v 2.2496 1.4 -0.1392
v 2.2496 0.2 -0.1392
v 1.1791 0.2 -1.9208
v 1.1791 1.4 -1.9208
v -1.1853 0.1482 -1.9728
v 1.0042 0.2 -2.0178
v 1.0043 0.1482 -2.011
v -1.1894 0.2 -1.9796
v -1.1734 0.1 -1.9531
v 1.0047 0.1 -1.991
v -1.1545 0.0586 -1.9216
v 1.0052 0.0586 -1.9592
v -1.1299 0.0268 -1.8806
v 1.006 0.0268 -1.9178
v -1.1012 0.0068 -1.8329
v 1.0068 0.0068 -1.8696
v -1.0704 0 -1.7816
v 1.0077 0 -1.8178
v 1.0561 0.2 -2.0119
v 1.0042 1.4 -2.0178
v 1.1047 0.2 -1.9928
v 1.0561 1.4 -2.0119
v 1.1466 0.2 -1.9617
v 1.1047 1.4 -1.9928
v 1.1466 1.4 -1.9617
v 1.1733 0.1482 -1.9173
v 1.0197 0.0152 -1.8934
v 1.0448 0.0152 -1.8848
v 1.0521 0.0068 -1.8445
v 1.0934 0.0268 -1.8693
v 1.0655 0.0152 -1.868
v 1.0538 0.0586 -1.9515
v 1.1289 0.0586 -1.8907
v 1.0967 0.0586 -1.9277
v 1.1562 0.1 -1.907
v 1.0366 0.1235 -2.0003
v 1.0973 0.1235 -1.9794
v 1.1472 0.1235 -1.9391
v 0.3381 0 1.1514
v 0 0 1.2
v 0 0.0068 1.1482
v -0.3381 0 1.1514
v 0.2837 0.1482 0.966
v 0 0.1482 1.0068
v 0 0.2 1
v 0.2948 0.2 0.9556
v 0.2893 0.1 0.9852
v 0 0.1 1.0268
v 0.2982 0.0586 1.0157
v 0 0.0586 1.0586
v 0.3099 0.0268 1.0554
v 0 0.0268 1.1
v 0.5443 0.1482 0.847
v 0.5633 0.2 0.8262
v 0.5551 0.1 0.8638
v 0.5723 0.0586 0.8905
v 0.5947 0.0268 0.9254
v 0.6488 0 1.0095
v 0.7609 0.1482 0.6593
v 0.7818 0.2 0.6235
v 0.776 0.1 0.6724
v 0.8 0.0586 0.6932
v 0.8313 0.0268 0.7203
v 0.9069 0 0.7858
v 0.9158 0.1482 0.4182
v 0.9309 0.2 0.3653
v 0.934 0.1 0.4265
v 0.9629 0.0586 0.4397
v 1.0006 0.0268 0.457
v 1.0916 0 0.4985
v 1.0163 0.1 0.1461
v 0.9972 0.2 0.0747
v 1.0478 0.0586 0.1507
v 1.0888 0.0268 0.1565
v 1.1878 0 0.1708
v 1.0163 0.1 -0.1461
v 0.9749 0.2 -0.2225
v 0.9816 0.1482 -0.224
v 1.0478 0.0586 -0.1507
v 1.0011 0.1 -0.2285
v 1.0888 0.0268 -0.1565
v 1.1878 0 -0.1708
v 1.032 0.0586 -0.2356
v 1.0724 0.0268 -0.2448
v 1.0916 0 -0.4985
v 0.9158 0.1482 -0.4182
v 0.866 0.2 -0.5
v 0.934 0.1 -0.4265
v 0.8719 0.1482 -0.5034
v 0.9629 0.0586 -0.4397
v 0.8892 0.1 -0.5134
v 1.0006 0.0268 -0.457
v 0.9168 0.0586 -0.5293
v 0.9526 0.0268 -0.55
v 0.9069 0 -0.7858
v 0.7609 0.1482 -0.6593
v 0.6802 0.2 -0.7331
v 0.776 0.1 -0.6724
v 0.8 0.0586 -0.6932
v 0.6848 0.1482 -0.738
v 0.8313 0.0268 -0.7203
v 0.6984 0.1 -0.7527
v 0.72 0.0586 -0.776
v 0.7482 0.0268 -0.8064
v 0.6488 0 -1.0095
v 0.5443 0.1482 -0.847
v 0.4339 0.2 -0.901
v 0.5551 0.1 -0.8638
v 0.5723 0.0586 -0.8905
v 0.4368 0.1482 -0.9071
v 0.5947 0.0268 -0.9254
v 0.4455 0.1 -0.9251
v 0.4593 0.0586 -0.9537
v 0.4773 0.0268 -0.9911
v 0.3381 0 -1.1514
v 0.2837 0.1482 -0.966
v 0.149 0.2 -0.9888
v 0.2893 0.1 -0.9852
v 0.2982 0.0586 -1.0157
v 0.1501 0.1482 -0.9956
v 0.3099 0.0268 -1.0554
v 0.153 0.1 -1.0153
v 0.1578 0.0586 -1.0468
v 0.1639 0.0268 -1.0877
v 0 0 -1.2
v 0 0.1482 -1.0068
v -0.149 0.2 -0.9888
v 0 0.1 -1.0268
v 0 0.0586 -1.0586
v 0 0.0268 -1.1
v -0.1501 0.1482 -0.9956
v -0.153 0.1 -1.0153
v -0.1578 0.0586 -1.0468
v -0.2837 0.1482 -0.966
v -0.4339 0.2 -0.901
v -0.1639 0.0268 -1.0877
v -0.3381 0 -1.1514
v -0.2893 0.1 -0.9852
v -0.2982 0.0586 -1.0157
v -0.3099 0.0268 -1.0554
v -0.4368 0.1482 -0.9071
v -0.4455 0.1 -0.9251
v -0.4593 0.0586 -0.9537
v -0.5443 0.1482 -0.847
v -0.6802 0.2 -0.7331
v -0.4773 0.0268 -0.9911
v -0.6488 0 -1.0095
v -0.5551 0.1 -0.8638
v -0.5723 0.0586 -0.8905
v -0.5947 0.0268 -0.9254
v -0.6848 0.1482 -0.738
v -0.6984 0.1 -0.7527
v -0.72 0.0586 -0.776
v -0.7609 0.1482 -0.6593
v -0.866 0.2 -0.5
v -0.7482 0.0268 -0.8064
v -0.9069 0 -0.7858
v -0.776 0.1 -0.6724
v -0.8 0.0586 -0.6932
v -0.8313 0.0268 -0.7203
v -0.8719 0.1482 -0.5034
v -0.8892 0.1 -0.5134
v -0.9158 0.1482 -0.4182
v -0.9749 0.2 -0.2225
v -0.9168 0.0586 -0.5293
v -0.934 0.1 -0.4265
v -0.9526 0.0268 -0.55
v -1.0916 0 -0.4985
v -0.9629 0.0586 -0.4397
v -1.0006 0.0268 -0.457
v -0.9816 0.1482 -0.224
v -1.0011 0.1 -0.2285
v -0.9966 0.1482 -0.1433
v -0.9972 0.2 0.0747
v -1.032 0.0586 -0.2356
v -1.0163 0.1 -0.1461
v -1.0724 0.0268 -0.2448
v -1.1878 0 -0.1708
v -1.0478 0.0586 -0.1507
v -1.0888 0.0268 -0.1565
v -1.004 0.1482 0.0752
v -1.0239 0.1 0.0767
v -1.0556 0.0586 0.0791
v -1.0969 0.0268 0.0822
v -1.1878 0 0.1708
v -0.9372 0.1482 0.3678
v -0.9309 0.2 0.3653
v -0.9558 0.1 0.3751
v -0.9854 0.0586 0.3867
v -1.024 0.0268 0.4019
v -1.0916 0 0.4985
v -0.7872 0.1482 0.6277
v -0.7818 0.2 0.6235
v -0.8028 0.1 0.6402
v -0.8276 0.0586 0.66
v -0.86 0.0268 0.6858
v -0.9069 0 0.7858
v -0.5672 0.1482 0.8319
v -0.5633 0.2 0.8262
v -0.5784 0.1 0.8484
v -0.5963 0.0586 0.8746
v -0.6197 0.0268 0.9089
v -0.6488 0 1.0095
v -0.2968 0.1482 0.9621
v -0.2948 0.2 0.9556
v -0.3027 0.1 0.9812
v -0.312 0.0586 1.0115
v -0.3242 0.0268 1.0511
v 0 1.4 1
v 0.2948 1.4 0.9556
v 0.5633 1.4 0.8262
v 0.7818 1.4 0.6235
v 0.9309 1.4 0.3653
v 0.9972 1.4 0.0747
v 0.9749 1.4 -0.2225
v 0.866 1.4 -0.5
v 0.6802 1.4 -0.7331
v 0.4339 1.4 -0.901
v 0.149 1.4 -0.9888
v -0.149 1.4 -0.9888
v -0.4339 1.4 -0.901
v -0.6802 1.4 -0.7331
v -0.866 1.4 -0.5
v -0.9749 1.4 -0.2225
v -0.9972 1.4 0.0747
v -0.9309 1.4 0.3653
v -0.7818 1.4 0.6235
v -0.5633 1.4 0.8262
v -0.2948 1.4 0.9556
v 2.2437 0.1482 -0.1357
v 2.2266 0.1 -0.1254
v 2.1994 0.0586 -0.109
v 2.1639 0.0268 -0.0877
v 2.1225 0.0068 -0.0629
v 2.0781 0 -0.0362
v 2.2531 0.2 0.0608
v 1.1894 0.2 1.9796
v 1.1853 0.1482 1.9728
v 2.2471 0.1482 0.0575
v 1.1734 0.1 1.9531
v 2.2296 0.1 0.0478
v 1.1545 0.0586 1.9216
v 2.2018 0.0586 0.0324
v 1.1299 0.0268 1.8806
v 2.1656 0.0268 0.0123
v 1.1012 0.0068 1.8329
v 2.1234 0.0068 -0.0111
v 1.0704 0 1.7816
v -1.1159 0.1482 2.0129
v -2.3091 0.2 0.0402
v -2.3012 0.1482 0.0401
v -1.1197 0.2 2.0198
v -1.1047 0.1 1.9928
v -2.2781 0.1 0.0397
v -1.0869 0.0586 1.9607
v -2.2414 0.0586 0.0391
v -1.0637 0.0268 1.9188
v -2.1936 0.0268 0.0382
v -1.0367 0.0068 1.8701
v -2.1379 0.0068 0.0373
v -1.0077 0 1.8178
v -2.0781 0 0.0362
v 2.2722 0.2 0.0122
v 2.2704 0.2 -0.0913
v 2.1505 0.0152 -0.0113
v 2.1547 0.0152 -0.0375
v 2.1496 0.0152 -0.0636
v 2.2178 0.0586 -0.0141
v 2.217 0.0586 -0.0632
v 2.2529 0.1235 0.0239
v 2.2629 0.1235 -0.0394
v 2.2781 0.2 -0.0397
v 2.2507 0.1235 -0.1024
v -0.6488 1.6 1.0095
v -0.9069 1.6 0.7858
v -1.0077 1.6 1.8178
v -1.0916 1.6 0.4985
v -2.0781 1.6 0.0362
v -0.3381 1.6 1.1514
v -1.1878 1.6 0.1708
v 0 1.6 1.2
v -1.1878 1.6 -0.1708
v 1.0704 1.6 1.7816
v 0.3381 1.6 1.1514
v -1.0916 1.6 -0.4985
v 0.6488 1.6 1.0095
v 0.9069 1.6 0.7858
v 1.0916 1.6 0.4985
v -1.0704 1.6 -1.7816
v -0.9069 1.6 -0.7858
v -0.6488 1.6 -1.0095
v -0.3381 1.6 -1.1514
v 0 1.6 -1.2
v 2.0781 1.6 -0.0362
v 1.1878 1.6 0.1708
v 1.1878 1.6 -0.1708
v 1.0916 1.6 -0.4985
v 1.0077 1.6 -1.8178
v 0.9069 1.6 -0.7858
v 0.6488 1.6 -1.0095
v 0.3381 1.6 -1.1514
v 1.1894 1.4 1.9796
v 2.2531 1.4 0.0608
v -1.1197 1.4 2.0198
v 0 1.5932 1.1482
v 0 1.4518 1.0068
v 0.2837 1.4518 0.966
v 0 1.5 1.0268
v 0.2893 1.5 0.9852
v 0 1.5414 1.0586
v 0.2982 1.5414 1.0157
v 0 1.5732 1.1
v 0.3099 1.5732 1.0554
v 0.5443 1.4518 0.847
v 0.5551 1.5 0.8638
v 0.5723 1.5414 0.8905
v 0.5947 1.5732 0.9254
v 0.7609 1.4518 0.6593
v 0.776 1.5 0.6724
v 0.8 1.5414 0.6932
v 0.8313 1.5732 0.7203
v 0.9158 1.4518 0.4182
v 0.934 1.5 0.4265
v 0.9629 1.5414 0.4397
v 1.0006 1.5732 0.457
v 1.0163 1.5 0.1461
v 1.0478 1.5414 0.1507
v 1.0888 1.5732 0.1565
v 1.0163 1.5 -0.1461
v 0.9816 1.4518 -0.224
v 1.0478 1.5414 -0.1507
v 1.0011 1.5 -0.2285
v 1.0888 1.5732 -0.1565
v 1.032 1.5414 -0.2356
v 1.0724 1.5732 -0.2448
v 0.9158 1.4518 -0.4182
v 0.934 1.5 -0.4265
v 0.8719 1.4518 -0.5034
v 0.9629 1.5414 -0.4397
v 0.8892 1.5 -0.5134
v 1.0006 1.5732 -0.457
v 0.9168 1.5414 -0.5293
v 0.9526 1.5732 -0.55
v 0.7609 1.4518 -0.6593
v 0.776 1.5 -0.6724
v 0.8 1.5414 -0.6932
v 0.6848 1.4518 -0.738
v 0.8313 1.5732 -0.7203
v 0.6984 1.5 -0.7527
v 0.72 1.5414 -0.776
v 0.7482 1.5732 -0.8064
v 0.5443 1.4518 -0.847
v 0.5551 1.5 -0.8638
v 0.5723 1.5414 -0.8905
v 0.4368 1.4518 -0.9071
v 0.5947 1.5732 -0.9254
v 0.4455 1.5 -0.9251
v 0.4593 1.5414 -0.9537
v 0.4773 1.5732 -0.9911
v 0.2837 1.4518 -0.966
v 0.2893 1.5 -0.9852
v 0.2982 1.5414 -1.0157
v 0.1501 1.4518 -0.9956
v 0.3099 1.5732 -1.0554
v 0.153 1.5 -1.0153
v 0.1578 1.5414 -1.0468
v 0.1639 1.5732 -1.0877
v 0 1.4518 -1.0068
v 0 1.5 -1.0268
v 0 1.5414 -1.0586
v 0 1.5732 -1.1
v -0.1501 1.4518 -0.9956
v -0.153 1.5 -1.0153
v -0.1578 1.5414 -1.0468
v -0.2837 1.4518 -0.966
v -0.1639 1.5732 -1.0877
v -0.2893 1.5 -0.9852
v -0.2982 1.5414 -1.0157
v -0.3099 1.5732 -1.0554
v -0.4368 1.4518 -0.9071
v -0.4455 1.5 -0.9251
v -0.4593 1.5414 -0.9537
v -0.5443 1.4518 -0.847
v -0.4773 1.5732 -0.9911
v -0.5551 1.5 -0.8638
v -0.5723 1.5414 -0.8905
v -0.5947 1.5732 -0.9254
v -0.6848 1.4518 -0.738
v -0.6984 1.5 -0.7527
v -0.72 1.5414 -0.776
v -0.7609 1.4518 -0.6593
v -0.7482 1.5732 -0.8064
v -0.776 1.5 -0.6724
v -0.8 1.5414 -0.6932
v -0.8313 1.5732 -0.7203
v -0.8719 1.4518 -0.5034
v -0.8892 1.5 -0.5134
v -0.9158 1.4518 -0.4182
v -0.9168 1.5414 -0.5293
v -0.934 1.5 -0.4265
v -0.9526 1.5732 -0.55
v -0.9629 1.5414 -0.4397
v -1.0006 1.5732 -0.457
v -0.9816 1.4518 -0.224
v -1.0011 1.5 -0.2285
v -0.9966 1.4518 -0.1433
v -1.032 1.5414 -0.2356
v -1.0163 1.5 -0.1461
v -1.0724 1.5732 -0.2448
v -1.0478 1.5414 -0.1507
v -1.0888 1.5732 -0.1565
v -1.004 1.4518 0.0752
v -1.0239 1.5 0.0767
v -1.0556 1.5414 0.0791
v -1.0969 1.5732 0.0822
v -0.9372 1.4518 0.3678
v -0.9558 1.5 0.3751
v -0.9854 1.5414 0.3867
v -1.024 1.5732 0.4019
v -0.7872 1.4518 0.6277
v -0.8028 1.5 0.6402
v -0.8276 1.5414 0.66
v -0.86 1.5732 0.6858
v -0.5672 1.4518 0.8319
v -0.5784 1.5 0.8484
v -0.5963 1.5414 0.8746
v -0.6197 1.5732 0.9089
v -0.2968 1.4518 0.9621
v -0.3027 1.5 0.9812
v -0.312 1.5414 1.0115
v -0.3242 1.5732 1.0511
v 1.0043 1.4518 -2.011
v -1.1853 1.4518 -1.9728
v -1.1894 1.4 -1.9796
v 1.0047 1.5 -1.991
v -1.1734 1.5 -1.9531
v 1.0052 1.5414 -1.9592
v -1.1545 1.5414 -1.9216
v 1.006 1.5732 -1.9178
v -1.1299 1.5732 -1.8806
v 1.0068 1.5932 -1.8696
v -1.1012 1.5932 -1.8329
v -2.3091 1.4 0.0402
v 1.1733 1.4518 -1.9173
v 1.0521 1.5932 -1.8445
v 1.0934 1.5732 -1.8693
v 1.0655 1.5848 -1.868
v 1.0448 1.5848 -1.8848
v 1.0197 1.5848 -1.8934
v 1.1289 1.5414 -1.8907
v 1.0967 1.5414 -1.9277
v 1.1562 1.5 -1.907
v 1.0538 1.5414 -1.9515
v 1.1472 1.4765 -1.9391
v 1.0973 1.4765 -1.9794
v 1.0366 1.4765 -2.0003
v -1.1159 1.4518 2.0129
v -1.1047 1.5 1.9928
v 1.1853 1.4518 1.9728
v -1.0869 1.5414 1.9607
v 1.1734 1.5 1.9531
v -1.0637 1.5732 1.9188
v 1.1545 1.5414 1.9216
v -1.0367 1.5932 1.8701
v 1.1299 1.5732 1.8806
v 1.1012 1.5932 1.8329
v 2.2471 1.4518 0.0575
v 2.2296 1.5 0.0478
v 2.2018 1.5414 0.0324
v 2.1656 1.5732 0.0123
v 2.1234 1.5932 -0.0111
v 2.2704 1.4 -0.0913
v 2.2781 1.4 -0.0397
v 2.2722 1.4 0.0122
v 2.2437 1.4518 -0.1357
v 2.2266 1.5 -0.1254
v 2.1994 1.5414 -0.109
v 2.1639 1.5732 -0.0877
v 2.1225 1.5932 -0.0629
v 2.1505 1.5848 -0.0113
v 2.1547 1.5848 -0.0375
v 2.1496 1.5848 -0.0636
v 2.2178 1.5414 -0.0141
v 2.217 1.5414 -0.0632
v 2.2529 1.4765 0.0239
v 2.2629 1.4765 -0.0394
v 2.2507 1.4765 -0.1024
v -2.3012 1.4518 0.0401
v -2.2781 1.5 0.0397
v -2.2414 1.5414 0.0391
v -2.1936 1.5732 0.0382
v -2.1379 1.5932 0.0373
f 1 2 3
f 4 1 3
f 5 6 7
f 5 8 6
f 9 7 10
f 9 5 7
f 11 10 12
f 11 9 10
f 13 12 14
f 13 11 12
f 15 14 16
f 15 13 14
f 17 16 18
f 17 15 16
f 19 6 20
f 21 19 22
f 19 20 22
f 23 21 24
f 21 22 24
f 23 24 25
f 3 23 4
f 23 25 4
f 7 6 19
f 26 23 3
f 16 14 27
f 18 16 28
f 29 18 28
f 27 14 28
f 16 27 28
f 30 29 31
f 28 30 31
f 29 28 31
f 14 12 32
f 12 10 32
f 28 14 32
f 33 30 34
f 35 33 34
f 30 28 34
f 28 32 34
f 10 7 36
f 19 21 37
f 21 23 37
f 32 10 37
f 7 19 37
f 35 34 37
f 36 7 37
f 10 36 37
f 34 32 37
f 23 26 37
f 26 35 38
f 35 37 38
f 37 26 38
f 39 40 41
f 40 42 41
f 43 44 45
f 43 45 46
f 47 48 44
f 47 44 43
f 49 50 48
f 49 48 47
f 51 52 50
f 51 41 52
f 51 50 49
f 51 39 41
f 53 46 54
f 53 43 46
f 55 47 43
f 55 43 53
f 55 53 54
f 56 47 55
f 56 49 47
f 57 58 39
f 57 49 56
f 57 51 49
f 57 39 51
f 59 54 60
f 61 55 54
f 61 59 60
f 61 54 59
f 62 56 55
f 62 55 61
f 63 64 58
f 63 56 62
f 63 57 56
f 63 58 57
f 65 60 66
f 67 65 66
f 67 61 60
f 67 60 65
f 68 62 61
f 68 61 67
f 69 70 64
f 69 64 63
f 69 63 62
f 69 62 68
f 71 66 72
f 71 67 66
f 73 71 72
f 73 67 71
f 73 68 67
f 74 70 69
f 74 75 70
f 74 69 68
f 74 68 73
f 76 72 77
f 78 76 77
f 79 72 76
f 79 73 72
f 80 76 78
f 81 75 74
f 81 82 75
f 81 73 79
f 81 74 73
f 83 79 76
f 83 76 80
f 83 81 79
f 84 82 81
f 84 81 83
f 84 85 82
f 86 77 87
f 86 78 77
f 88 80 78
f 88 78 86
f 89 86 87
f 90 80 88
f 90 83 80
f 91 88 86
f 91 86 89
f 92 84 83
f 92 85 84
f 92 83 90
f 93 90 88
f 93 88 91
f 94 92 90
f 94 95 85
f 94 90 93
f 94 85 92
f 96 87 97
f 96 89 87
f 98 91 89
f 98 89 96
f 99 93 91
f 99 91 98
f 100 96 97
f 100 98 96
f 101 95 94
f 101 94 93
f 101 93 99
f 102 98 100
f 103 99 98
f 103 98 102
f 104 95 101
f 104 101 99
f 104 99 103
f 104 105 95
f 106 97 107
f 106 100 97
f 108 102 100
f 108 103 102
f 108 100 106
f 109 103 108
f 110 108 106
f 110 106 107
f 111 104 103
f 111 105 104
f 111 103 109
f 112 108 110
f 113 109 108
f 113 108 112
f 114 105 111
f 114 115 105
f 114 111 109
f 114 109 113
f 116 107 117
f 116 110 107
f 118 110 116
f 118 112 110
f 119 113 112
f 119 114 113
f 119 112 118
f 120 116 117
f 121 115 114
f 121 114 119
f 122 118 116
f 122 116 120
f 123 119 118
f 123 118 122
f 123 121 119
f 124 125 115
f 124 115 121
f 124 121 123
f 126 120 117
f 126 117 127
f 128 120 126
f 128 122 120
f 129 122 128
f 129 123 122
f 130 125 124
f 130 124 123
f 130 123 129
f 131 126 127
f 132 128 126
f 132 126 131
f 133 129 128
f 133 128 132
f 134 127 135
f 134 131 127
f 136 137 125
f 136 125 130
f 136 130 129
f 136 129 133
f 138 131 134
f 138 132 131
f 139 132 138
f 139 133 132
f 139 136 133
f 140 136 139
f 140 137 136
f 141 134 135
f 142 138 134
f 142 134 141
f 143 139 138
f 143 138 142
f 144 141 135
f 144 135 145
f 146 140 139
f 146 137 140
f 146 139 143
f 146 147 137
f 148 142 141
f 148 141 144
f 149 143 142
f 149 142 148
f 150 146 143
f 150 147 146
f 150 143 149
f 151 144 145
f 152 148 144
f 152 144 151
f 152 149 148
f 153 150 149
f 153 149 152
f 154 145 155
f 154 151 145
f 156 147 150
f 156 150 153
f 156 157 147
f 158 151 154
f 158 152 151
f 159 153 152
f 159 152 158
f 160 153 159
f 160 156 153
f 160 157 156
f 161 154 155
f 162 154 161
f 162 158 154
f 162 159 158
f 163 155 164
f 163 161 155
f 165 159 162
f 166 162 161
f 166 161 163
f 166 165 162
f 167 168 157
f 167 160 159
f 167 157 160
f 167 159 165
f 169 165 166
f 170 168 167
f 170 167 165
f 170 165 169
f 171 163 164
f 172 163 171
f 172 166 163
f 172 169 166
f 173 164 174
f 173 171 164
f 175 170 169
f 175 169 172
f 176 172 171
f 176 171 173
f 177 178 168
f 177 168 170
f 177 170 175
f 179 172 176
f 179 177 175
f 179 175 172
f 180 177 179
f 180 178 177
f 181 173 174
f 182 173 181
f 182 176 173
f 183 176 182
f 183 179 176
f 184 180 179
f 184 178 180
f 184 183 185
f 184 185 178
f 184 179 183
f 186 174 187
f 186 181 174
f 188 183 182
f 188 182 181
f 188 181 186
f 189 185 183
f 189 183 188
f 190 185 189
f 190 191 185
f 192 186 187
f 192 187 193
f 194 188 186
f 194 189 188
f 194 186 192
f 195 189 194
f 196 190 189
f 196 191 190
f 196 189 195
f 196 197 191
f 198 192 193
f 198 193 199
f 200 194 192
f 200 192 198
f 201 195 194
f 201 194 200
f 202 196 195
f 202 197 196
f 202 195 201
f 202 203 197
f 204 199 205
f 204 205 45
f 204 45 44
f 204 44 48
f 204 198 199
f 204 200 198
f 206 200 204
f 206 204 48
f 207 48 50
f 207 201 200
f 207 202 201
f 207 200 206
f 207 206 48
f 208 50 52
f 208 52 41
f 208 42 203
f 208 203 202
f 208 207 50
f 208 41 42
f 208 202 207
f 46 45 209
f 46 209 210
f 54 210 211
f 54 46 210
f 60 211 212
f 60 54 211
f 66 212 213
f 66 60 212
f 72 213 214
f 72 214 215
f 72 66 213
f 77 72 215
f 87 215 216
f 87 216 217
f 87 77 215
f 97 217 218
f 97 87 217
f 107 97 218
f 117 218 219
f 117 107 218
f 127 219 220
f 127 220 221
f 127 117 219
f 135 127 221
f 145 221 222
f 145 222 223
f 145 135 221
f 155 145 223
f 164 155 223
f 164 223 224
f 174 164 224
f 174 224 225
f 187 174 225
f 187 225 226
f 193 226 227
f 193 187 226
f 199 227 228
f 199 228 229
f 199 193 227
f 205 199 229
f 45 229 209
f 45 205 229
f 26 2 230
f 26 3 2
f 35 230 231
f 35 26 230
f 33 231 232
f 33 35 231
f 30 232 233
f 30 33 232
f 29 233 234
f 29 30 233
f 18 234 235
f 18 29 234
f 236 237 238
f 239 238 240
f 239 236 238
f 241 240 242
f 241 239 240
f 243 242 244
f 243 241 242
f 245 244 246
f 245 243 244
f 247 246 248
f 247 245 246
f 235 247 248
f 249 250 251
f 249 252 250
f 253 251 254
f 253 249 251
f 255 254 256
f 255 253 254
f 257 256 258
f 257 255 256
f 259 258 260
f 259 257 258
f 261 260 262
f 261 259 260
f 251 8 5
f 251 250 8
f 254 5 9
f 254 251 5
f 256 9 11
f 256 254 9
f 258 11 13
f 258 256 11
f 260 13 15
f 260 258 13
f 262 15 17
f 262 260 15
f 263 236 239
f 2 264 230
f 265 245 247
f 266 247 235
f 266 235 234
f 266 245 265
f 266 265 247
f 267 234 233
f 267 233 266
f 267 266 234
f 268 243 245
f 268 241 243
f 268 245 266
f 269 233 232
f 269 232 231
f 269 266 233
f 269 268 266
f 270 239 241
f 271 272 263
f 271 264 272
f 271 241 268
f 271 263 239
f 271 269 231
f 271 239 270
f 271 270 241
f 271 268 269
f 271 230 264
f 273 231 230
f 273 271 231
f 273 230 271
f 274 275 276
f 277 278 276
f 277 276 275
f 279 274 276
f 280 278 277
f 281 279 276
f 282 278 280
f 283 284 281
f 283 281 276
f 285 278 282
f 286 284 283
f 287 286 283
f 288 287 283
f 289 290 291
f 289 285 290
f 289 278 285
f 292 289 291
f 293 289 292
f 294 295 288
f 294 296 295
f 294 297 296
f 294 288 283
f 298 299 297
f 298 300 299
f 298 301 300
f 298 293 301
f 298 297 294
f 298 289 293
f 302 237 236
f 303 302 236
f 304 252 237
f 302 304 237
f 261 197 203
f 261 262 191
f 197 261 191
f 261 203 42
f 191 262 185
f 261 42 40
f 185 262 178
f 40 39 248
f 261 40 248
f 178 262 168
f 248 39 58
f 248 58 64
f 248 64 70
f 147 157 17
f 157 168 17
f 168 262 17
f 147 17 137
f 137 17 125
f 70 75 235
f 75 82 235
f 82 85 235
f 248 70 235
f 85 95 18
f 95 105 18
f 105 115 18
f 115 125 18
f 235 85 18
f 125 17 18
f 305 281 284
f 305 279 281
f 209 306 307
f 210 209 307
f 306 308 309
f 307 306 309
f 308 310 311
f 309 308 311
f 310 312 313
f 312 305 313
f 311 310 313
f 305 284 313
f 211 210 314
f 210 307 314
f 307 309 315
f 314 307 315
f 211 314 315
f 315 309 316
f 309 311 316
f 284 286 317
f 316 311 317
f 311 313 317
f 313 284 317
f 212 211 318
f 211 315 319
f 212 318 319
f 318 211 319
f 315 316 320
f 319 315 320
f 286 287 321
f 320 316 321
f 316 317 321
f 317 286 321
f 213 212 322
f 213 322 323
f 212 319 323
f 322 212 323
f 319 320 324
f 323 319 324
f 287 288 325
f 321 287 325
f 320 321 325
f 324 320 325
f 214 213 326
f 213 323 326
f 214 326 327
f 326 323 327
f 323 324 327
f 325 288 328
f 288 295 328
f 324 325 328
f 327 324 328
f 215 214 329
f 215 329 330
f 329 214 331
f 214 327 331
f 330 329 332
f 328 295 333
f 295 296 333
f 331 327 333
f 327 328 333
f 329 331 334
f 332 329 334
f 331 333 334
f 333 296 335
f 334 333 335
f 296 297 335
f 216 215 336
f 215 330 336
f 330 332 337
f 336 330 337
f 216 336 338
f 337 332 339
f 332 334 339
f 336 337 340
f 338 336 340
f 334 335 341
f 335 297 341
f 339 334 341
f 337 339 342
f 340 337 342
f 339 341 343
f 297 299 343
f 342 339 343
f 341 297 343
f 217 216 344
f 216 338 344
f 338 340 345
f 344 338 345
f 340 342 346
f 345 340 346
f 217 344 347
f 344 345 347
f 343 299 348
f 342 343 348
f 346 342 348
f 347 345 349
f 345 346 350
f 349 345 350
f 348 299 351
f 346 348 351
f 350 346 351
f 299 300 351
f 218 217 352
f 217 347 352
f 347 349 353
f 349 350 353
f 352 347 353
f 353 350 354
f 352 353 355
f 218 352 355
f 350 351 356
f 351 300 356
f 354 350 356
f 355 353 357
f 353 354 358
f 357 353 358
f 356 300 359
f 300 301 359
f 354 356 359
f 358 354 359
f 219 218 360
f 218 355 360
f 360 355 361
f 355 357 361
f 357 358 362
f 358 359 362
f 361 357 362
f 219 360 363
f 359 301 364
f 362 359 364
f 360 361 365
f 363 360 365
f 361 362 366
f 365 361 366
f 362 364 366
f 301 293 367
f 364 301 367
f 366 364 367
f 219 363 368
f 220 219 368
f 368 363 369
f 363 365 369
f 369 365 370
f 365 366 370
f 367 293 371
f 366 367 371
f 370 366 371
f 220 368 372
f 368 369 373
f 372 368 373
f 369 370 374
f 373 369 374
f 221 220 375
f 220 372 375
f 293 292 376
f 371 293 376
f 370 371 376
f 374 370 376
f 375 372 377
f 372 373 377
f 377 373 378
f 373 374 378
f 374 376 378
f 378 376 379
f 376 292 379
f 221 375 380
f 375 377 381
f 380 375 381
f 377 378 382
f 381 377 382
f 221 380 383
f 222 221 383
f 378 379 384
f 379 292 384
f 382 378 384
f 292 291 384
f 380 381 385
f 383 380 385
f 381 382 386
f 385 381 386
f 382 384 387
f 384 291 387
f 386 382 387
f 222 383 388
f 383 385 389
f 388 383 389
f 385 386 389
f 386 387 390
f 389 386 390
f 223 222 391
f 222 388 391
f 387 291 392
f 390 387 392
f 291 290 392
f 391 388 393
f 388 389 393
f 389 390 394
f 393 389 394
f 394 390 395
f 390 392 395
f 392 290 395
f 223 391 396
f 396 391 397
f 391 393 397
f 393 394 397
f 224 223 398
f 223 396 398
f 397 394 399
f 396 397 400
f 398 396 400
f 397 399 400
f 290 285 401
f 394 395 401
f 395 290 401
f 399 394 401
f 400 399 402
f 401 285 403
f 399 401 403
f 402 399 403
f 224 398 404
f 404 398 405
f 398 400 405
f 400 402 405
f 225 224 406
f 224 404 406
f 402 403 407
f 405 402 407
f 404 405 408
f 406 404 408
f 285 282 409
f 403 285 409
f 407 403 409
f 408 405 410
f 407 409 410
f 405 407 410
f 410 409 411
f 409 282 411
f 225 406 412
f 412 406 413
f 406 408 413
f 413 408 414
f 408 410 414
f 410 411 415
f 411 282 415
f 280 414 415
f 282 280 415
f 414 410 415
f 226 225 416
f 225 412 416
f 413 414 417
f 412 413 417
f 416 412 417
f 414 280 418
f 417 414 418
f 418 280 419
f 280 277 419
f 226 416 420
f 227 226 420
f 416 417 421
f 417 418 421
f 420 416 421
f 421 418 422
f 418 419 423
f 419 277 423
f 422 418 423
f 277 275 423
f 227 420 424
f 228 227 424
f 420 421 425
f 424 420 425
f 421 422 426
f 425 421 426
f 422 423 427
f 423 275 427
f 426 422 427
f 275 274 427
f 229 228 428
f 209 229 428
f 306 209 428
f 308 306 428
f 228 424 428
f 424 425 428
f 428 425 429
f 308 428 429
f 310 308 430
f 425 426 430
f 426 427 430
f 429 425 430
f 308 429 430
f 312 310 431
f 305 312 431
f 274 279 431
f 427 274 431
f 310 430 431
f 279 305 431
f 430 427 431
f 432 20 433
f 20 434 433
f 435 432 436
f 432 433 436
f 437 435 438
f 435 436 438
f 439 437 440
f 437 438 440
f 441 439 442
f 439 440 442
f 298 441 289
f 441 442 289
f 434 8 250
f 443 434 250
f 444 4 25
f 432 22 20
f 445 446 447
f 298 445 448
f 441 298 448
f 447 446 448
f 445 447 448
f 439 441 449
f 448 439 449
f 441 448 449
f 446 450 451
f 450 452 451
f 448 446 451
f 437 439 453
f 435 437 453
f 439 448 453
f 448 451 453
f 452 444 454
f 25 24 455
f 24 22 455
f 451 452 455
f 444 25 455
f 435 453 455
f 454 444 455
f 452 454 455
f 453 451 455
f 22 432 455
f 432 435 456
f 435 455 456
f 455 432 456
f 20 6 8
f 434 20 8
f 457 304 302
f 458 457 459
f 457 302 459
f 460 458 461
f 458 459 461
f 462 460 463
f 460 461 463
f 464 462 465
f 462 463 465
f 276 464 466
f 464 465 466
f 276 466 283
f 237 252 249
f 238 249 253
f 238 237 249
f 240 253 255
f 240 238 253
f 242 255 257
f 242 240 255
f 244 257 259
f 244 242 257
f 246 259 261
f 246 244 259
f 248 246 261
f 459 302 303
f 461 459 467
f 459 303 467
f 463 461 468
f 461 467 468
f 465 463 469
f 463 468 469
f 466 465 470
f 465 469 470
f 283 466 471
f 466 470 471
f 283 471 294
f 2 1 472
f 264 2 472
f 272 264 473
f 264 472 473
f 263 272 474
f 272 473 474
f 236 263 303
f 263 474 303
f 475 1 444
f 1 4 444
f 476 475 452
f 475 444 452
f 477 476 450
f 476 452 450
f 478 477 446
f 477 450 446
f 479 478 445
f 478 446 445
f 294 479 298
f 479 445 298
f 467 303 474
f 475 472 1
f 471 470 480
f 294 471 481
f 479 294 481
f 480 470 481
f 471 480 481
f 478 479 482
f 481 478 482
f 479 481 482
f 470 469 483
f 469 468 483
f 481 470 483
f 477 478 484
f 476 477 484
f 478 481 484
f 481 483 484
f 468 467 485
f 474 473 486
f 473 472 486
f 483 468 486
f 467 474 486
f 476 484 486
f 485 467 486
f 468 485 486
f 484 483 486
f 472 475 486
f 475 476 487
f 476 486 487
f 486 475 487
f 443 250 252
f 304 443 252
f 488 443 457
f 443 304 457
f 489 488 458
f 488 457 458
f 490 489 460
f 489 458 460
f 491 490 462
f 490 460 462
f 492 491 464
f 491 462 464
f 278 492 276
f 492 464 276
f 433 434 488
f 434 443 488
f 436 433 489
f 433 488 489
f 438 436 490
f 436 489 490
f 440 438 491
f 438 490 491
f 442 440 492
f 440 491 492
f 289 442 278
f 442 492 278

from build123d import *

# Parameters (mm, degrees)
SKETCH_1_R      = 1
EXTRUDE_1_DEPTH = 1.6
FILLET_1_R      = 0.2


with BuildPart() as part:
    # 草图1 → 凸台-拉伸1 (new body)
    with BuildSketch(Plane(origin=(0, 0, 0), x_dir=(1, 0, 0), z_dir=(0, 1, 0))):
        Polygon((1.119679768, 2.019814484), (-1.18937077, 1.979578365), (-2.309050538, -0.040236119), (-1.119679768, -2.019814484), (1.18937077, -1.979578365), (2.309050538, 0.040236119), align=None)
        with Locations(Location((0, 0, 0), (0, 0, 270))):
            Circle(SKETCH_1_R, mode=Mode.SUBTRACT)
    extrude(amount=EXTRUDE_1_DEPTH)

    # 圆角1
    fillet_1_edges = [part.edges().sort_by_distance(p)[0] for p in [
        (2.309050538, 0.8, -0.040236119),
        (1.119679768, 0.8, -2.019814484),
        (-1.749210654, 1.6, -0.969671123),
        (-1.714365153, 1.6, 1.030025301),
        (0, 0, -1),
        (0, 1.6, -1),
        (0.034845501, 1.6, 1.999696425),
        (1.749210654, 1.6, 0.969671123),
        (1.714365153, 1.6, -1.030025301),
        (1.749210654, 0, 0.969671123),
        (0.034845501, 0, 1.999696425),
        (-1.714365153, 0, 1.030025301),
        (-1.749210654, 0, -0.969671123),
        (-0.034845501, 0, -1.999696425),
        (1.714365153, 0, -1.030025301),
        (-0.034845501, 1.6, -1.999696425),
    ]]
    fillet(fillet_1_edges, radius=FILLET_1_R)


solid = part.part
